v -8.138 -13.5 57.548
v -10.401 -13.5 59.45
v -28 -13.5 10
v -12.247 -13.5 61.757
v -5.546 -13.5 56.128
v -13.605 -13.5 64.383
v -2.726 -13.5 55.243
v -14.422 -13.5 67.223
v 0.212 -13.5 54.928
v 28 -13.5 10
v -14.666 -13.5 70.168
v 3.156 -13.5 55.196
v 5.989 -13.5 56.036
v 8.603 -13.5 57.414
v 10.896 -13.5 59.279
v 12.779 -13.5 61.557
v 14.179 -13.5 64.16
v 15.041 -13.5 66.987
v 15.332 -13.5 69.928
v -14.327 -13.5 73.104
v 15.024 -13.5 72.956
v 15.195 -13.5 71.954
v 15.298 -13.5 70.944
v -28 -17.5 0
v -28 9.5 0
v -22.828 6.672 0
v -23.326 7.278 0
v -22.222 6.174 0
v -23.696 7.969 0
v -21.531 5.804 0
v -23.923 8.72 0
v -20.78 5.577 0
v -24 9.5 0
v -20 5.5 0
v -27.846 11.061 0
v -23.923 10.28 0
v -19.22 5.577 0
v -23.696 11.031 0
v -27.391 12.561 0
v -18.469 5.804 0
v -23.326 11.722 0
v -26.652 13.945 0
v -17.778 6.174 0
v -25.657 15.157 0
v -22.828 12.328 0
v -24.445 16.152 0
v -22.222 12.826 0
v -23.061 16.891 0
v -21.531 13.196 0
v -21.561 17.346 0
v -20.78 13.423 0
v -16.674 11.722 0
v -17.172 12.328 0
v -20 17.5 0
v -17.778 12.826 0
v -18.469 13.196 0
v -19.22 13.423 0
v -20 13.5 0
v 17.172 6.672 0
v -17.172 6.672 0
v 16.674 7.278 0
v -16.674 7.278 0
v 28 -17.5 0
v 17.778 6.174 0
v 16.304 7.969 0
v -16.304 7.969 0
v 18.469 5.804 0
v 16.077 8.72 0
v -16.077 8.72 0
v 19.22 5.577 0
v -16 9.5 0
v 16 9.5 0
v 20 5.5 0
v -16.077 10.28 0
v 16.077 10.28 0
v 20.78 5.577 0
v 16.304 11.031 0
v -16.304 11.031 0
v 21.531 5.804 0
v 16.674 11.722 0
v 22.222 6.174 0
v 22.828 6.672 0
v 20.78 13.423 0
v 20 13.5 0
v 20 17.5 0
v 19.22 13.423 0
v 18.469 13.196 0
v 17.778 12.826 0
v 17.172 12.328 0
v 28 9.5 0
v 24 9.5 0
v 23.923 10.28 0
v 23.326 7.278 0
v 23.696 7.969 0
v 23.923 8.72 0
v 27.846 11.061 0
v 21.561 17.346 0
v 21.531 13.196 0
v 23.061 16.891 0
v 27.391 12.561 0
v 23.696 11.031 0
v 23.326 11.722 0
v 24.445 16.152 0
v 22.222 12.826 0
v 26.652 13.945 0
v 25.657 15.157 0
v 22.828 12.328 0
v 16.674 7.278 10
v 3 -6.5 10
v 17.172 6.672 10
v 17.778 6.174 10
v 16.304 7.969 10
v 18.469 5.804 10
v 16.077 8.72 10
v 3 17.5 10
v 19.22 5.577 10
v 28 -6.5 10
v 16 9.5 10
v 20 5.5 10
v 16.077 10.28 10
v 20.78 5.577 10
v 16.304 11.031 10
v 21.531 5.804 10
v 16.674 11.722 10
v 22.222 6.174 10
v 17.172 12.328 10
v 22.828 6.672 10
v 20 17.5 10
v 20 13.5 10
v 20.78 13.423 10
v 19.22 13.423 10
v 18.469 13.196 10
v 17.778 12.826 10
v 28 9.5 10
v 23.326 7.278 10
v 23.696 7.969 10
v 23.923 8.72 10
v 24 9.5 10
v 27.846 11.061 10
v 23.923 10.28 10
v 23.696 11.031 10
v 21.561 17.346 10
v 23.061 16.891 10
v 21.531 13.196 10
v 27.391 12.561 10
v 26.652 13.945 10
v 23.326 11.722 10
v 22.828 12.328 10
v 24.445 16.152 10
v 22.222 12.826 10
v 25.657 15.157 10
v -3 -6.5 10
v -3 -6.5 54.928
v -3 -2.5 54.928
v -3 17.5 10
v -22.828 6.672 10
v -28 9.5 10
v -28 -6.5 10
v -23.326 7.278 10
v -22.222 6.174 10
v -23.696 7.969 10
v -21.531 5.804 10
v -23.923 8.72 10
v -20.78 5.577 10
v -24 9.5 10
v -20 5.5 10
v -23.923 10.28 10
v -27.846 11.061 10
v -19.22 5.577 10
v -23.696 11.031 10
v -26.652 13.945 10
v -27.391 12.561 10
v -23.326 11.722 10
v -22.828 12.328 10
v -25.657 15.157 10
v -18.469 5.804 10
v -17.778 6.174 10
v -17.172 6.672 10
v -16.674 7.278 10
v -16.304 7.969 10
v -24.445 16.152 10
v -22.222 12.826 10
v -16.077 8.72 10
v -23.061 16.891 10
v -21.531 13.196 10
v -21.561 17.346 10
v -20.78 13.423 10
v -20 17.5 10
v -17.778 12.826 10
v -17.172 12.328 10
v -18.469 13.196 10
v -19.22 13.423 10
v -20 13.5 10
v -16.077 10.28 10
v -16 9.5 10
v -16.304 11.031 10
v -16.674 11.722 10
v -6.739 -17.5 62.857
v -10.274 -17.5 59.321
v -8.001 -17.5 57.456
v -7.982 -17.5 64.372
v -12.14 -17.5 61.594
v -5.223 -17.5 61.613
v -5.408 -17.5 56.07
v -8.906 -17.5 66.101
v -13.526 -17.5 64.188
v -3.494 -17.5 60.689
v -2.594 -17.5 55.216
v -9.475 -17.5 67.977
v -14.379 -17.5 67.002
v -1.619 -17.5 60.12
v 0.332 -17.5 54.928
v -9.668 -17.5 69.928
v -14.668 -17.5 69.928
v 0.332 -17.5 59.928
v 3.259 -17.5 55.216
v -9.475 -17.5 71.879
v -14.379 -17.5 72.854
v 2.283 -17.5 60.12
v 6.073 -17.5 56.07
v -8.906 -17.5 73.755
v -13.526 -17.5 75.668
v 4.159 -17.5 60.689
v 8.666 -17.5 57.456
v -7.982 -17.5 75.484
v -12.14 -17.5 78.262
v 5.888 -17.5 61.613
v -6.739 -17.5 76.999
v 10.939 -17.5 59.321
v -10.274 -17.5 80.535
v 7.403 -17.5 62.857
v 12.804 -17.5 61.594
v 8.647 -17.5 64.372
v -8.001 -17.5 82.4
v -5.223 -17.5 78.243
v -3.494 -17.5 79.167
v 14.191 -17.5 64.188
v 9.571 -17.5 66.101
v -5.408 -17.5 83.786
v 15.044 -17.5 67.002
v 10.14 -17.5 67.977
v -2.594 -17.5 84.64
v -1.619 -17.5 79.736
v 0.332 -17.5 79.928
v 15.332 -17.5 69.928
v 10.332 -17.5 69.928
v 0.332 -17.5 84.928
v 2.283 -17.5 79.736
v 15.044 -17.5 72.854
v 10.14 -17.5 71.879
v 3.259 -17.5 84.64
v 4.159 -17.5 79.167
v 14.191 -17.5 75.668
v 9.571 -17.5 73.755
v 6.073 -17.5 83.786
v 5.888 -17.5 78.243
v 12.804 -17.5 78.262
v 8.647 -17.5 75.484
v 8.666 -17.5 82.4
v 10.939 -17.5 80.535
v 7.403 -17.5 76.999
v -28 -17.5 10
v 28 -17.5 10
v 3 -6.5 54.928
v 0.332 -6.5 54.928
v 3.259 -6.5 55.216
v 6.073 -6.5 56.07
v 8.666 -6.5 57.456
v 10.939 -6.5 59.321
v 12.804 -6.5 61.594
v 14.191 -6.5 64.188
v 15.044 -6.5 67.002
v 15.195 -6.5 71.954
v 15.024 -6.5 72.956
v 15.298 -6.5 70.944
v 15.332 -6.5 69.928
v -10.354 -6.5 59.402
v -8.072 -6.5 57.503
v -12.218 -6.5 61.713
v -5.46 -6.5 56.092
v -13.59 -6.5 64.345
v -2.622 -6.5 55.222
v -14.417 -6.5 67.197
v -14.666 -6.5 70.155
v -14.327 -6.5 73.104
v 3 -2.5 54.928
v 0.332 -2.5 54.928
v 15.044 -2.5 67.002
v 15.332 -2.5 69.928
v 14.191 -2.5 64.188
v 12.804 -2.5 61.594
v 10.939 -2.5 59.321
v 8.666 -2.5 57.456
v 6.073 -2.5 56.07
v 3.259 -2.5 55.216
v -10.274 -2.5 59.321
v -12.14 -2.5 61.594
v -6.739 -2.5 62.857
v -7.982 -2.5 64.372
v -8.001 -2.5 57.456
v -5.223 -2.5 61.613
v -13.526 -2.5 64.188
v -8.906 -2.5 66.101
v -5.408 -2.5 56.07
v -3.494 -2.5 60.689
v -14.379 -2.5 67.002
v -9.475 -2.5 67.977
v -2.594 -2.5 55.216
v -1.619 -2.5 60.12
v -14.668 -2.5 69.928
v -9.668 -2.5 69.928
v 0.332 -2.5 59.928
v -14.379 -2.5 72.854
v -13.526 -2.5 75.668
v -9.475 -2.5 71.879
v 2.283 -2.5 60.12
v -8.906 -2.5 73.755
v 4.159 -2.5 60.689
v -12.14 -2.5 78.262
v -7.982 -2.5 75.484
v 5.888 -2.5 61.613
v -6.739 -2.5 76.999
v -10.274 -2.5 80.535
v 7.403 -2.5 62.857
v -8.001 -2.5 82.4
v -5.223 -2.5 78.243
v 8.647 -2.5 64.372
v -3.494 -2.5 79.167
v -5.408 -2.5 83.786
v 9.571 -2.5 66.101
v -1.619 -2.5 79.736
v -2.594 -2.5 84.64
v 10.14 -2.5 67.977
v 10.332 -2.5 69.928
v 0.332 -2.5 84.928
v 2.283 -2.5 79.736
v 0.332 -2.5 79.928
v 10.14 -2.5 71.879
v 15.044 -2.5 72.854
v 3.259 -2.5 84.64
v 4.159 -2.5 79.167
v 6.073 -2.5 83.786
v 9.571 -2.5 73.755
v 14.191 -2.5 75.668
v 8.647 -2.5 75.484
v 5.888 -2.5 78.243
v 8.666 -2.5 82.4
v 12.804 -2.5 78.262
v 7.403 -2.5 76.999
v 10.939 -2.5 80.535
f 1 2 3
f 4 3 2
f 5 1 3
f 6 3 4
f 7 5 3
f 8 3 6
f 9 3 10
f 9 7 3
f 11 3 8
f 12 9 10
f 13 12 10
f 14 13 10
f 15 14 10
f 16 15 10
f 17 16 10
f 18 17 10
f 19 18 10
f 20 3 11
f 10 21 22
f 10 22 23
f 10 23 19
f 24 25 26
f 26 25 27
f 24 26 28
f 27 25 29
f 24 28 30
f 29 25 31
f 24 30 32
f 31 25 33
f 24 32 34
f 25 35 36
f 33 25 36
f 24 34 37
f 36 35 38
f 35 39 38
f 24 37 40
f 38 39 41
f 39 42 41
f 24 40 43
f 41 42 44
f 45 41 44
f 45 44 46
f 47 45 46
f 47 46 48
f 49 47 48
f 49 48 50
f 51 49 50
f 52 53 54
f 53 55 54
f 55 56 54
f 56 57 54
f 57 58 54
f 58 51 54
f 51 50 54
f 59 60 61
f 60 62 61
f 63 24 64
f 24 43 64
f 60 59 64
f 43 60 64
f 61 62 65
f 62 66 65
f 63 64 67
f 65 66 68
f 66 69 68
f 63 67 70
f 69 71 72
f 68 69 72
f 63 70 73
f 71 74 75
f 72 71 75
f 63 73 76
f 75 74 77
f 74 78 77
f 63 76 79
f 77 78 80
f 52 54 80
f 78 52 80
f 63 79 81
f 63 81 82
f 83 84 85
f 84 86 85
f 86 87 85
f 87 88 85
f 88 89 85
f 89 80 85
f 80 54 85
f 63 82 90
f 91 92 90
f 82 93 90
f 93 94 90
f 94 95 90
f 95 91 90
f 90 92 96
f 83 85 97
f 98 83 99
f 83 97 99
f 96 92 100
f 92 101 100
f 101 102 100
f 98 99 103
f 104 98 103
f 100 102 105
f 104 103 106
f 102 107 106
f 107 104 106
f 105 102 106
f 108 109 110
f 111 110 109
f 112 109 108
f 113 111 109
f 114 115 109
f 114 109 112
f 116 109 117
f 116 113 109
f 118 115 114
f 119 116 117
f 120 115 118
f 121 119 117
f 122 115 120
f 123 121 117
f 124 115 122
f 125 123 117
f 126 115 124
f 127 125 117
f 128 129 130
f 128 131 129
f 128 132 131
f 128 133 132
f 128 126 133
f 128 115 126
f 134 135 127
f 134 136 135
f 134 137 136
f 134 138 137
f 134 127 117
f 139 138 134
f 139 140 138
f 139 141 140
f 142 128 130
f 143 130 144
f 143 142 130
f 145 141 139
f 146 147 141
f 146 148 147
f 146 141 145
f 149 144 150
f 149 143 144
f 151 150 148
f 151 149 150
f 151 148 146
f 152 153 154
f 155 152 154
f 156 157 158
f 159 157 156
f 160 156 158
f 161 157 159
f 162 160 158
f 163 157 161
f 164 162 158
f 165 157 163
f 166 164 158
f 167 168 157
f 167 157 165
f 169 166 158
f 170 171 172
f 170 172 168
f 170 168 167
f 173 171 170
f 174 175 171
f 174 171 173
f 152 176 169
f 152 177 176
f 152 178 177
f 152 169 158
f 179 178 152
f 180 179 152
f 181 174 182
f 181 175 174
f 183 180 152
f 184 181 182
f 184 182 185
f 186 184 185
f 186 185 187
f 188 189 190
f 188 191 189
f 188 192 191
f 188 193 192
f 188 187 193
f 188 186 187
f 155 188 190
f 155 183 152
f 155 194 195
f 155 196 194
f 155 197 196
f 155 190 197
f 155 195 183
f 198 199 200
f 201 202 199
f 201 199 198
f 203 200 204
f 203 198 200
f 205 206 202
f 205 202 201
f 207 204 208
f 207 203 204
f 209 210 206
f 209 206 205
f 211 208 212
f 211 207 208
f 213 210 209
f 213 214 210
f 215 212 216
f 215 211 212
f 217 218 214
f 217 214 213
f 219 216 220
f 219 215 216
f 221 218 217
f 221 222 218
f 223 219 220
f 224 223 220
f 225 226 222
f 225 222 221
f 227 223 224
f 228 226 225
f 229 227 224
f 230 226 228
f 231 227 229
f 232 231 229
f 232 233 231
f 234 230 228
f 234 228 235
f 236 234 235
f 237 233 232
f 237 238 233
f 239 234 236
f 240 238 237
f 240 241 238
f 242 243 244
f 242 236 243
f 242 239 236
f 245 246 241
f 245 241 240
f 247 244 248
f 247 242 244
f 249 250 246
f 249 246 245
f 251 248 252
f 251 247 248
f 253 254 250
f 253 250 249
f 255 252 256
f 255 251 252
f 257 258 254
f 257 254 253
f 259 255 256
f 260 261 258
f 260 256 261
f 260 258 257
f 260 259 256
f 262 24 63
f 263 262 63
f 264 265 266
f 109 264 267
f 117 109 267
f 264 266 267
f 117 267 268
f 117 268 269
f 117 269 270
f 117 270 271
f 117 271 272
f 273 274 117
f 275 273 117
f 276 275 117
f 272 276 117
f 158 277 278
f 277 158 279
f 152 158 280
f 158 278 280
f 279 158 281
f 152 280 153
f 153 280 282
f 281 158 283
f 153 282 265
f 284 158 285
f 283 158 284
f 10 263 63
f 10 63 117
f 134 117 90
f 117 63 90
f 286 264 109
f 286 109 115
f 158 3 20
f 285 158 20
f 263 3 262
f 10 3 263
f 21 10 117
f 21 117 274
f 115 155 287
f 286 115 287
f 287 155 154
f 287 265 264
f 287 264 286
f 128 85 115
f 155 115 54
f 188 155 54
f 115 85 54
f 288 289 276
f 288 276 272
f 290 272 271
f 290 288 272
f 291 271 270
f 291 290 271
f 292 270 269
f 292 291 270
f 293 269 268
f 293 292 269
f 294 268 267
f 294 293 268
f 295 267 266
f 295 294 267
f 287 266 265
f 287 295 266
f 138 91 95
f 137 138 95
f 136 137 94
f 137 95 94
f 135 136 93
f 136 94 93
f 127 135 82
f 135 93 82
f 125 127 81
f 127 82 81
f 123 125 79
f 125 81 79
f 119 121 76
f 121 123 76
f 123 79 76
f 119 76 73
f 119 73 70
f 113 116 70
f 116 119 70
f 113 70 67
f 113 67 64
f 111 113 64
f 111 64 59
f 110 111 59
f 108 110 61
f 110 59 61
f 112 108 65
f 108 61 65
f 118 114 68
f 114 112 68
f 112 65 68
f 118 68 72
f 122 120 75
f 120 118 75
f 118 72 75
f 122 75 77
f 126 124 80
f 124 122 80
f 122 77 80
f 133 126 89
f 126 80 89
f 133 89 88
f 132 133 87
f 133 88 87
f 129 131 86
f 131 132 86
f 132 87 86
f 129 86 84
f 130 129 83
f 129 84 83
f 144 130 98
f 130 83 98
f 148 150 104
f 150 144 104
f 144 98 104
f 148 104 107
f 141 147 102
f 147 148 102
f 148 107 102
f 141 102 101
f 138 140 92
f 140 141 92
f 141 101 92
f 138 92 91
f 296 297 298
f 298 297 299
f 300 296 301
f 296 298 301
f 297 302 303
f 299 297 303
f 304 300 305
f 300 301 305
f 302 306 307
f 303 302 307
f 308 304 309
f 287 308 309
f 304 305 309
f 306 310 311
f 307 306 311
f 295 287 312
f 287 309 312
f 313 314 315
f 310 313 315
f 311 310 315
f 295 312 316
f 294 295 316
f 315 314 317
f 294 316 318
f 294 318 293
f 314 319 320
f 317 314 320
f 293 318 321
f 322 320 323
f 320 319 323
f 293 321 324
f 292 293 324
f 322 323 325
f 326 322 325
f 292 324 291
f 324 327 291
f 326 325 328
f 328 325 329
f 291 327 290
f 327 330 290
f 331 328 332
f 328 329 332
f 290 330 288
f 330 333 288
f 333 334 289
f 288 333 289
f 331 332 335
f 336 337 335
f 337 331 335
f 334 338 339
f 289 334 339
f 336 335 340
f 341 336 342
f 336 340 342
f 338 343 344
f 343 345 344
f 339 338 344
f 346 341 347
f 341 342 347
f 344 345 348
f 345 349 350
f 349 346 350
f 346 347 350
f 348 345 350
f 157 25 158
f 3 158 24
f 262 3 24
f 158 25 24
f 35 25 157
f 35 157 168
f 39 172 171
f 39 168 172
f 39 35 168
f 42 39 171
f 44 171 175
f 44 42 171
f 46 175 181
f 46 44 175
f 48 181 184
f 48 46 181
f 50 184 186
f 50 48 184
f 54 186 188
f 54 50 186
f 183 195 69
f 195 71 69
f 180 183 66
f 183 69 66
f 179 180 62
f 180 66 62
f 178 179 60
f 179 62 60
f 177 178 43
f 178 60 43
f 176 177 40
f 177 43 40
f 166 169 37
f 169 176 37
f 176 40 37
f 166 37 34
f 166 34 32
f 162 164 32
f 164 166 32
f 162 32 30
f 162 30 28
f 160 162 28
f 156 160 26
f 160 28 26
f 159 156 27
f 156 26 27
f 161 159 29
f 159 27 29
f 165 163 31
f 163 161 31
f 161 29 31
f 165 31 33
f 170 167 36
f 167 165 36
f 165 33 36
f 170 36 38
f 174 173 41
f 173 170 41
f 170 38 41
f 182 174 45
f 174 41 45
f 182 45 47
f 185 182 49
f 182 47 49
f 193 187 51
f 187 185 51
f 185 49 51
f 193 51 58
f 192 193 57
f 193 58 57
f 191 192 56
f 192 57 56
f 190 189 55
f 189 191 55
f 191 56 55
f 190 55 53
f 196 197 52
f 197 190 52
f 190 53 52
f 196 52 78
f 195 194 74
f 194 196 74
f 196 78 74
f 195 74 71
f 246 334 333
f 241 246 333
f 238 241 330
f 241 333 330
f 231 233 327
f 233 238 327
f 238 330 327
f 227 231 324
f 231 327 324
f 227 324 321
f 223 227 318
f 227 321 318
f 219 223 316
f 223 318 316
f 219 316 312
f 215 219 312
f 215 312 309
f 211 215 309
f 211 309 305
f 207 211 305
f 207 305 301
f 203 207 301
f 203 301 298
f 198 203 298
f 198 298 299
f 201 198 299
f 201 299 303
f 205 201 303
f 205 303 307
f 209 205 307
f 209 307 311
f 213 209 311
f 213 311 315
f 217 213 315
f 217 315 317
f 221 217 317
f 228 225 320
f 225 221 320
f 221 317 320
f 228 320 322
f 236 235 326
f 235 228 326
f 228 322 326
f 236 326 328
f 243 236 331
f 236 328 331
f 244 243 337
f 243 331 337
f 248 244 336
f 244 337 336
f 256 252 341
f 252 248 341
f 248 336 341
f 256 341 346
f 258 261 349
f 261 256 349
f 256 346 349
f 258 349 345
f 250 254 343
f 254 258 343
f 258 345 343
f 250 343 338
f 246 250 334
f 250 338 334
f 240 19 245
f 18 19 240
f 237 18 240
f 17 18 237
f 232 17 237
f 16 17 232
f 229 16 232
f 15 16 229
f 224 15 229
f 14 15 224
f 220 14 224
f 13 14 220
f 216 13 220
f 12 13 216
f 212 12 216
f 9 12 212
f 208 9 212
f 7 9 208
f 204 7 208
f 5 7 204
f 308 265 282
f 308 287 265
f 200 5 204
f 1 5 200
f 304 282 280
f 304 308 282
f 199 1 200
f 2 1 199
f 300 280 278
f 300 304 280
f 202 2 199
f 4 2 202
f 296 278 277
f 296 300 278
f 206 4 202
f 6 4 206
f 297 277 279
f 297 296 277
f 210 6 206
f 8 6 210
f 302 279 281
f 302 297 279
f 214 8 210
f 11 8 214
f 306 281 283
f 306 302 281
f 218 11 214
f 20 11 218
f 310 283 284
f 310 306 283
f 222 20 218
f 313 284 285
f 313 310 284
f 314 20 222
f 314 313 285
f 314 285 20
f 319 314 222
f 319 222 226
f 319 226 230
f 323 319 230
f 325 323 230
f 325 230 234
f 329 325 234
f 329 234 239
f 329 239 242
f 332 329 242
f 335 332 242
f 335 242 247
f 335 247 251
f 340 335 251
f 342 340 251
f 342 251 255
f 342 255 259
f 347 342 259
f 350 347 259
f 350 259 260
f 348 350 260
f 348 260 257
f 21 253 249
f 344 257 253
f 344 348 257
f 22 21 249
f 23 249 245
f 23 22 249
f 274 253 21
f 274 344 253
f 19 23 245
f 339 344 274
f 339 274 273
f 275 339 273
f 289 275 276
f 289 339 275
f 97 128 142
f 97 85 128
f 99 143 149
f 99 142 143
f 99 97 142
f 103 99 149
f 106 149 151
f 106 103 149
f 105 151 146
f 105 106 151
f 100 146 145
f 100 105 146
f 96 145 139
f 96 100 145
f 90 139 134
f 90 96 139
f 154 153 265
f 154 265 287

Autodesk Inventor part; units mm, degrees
ref_plane "YZ Plane" through (0, 0, 0) normal (1, 0, 0) x (0, 1, 0)
ref_plane "XZ Plane" through (0, 0, 0) normal (0, 1, 0) x (-1, 0, 0)
sketch "Boceto1" plane through (0, 0, 0) normal (0, 0, 1) x (1, 0, 0)
  line L0 (-28, -17.5) -> (28, -17.5)
  line L1 (28, -17.5) -> (28, 9.5)
  line L2 (20, 17.5) -> (-20, 17.5)
  line L3 (-28, 9.5) -> (-28, -17.5)
  line L4 (-28, -17.5) -> (28, 17.5) construction
  line L5 (28, -17.5) -> (-28, 17.5) construction
  arc A0 (-20, 17.5) -> (-28, 9.5) centre (-20, 9.5) ccw
  arc A1 (28, 9.5) -> (20, 17.5) centre (20, 9.5) ccw
  circle A2 centre (-20, 9.5) radius 4
  circle A3 centre (20, 9.5) radius 4
  point P0 (0, 0)
  dimension "d0" = 56
  dimension "d1" = 35
  dimension "d2" = 8
  dimension "d3" = 8
  dimension "d4" = 8
extrude "Extrusión1" add sketch "Boceto1" along normal blind 10
ref_plane "Plano de trabajo2" through (-28, -13.5, 0) normal (0, -1, 0) x (1, 0, 0)
sketch "Boceto2" plane through (-28, -13.5, 0) normal (0, -1, 0) x (1, 0, 0)
  circle A0 centre (28.3324, 69.928) radius 15
  circle A1 centre (28.3324, 69.928) radius 10
  line L0 (8, 10) -> (0, 10) projected
  line L1 (0, 10) -> (13.6726, 73.1043)
  line L2 (56, 0) -> (56, 10) projected
  line L3 (56, 10) -> (43.0236, 72.9561)
  line L4 (0, 10) -> (56, 10)
  point P0 (28, 0)
  dimension "d8" = 30
  dimension "d9" = 20
extrude "Extrusión2" add sketch "Boceto2" against normal blind 7 contours A0 L3 L4 L0 L1
extrude "Extrusión3" add sketch "Boceto2" against normal blind 11 contours A0
extrude "Extrusión4" add sketch "Boceto2" along normal blind 4 contours A0
sketch "Boceto3" plane through (0, 0, 0) normal (1, 0, 0) x (0, 1, 0)
  line L0 (9.5, 10) -> (-6.5, 10) projected
  line L1 (-6.5, 10) -> (17.5, 10)
  line L2 (17.5, 10) -> (-2.5, 54.928)
  line L3 (-17.5, 54.928) -> (-2.5, 54.928) projected
  line L4 (-6.5, 54.928) -> (-6.5, 10)
  line L5 (-6.5, 10) -> (-6.5, 73.1043) projected
  line L6 (-6.5, 54.928) -> (-2.5, 54.928)
  line L7 (-6.5, 54.928) -> (-6.5, 10)
  point P0 (0, 0)
  dimension "d17" = 24
extrude "Extrusión5" add sketch "Boceto3" along normal mid plane 6
properties part number "Soporte polea"
